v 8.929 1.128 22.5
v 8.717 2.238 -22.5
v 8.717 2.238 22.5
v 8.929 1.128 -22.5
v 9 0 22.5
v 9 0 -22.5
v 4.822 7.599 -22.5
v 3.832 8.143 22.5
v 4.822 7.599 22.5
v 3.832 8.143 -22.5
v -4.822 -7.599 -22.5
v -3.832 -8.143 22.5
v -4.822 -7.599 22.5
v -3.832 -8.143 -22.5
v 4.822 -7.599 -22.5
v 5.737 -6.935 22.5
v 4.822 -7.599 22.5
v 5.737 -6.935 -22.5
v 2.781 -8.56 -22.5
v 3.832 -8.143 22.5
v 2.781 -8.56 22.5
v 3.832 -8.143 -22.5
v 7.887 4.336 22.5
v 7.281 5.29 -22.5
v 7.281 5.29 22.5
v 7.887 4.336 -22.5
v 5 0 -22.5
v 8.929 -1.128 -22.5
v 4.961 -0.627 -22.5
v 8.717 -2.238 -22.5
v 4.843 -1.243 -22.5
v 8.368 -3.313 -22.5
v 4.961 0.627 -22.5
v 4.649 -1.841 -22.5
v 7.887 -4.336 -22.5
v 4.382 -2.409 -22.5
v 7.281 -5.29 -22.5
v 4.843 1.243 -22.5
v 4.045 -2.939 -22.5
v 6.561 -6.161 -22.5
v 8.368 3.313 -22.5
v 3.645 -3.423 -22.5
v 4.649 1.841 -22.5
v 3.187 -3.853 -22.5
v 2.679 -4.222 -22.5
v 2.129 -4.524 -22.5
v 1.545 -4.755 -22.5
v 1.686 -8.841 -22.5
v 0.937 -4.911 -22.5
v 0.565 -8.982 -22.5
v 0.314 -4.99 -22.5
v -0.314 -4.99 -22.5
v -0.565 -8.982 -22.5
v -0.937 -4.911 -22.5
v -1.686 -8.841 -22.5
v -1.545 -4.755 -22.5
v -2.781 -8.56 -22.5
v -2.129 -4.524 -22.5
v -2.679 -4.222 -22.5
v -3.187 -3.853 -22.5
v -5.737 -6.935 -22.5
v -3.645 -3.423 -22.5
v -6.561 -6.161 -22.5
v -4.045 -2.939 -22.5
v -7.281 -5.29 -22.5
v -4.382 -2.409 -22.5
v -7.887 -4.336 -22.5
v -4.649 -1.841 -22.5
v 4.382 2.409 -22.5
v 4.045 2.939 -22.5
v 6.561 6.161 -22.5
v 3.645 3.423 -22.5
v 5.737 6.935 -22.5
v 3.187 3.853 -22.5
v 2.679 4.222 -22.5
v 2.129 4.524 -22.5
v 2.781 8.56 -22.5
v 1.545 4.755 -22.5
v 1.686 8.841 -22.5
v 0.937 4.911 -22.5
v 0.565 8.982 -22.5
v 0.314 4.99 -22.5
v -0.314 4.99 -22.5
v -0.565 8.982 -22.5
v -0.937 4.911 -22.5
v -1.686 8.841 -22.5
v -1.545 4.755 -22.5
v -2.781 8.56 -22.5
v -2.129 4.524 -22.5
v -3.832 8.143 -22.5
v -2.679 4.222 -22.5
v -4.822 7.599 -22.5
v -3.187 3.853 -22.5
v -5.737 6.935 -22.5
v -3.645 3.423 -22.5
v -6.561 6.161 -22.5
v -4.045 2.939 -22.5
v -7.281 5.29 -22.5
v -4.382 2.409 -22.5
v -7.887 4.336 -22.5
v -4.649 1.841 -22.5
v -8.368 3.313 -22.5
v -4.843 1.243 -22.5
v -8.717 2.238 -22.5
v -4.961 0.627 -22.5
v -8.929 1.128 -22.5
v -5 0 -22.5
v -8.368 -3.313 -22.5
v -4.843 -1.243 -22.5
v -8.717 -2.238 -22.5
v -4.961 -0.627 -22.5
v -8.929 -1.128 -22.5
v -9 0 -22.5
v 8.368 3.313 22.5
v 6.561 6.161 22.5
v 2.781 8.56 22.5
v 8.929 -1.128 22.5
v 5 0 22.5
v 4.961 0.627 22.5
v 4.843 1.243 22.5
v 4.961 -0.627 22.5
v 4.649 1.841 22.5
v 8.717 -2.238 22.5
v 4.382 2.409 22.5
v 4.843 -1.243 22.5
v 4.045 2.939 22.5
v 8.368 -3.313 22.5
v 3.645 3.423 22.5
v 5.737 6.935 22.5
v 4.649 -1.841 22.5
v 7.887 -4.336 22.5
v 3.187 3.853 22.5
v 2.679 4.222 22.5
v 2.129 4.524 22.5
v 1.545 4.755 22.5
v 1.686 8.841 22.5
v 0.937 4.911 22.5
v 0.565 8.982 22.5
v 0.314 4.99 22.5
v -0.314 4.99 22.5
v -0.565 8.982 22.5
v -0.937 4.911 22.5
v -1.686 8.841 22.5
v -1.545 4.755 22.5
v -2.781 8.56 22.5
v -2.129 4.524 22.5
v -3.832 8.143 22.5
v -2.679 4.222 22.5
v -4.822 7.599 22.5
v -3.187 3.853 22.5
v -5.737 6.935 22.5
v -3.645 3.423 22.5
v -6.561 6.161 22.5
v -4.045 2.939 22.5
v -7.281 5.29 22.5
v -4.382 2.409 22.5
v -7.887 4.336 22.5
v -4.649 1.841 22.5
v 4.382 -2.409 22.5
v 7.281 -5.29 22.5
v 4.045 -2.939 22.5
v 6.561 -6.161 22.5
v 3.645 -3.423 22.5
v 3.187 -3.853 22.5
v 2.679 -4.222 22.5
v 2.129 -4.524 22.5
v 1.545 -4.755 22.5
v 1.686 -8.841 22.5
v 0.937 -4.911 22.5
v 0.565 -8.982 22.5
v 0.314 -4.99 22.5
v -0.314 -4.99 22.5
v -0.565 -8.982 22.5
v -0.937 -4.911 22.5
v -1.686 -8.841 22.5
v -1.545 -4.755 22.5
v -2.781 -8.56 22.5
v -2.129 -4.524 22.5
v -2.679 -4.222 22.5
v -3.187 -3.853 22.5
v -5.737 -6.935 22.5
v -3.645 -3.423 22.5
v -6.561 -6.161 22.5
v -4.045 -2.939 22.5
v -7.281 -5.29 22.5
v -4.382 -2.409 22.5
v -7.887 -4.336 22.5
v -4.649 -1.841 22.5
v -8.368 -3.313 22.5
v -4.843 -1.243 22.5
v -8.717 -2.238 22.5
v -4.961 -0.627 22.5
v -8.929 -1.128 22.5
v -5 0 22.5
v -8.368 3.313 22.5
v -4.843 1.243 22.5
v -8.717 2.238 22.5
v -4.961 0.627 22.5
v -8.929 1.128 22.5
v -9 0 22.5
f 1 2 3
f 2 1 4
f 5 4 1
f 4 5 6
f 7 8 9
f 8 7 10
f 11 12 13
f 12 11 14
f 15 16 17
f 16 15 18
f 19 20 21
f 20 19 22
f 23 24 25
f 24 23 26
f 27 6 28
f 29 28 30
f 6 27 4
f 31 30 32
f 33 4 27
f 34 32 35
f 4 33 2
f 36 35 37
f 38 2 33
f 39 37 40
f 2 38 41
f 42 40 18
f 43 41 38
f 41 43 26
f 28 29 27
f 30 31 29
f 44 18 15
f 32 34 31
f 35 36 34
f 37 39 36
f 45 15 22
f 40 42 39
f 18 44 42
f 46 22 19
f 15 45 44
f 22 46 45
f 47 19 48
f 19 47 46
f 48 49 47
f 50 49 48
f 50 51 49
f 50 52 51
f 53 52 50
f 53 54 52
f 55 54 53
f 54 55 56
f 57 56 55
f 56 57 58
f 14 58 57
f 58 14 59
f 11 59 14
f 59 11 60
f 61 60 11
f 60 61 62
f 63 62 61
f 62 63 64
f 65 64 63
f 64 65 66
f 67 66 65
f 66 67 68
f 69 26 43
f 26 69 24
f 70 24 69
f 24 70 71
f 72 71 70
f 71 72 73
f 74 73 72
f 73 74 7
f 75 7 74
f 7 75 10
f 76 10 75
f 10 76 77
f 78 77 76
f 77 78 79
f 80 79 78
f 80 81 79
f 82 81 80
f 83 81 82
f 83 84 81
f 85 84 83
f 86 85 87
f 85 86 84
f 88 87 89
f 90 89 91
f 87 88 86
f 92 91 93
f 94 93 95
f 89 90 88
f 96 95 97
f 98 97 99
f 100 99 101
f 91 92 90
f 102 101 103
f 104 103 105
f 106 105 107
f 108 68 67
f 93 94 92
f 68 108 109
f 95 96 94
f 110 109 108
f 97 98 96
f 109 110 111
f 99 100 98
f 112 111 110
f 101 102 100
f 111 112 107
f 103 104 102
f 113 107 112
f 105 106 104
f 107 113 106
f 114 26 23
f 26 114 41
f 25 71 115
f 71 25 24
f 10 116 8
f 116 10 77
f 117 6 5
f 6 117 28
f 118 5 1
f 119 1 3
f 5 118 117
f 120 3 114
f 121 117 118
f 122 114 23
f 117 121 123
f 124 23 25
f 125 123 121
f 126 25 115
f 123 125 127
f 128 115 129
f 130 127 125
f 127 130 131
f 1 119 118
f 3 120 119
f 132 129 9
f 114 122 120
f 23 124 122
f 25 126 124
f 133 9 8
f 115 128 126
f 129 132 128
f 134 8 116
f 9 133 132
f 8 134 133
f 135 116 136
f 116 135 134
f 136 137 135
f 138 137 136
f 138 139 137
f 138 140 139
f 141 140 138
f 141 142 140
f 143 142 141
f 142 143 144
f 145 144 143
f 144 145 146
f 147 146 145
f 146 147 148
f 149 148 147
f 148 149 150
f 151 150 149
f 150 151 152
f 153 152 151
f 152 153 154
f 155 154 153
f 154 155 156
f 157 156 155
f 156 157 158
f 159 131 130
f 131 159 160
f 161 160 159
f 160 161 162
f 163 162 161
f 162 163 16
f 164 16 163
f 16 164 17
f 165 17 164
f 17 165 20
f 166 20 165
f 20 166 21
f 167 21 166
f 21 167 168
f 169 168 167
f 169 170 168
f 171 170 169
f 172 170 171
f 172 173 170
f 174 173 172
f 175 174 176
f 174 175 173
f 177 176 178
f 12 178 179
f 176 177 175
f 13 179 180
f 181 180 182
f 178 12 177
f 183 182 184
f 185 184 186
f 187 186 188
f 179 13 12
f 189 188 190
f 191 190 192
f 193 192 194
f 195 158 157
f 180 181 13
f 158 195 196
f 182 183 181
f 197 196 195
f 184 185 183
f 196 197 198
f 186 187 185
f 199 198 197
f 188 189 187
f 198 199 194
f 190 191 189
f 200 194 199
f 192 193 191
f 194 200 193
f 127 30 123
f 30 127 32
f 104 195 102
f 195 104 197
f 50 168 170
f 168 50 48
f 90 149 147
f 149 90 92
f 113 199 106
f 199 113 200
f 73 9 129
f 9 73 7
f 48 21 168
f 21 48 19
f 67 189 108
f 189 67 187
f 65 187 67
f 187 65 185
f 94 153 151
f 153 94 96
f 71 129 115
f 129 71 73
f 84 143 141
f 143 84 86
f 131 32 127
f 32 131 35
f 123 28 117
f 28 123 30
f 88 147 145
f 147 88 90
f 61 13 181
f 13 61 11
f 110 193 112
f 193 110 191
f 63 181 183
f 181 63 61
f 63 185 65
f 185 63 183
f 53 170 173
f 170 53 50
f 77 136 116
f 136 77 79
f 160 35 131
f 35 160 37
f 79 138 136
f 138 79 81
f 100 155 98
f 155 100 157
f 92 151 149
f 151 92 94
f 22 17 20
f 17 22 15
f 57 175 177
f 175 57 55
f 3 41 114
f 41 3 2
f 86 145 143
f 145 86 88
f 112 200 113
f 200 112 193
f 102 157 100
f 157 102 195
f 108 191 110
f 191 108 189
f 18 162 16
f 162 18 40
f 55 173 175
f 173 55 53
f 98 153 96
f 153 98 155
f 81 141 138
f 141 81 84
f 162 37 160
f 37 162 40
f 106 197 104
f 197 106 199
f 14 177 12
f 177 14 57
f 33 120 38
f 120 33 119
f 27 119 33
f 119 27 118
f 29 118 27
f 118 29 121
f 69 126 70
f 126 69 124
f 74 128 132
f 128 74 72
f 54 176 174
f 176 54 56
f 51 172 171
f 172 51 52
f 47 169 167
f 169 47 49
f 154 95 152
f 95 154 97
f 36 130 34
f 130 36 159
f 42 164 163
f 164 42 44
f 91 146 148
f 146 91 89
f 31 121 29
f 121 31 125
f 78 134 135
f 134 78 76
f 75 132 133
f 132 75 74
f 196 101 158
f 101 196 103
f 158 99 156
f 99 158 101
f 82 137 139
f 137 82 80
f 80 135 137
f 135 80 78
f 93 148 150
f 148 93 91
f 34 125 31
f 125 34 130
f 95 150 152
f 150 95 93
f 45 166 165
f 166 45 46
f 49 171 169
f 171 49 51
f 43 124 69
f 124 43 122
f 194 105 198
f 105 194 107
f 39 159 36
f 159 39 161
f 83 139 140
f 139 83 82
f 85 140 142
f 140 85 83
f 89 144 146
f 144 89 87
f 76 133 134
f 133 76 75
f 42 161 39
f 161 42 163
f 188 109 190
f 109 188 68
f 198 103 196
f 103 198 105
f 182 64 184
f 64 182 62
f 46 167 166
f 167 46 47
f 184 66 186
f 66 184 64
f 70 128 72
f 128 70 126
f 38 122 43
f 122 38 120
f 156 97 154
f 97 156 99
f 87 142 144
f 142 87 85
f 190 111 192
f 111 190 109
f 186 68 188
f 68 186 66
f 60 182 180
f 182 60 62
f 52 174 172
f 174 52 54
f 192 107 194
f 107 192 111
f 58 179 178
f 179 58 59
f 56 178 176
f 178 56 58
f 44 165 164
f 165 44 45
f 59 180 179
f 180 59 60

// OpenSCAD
$fn = 50;


difference() {
	union() {
		translate(v = [0, 0, -22.5000000000]) {
			cylinder(h = 45, r = 9.0000000000);
		}
	}
	union() {
		translate(v = [0, 0, -100.0000000000]) {
			cylinder(h = 200, r = 5.0000000000);
		}
	}
}
